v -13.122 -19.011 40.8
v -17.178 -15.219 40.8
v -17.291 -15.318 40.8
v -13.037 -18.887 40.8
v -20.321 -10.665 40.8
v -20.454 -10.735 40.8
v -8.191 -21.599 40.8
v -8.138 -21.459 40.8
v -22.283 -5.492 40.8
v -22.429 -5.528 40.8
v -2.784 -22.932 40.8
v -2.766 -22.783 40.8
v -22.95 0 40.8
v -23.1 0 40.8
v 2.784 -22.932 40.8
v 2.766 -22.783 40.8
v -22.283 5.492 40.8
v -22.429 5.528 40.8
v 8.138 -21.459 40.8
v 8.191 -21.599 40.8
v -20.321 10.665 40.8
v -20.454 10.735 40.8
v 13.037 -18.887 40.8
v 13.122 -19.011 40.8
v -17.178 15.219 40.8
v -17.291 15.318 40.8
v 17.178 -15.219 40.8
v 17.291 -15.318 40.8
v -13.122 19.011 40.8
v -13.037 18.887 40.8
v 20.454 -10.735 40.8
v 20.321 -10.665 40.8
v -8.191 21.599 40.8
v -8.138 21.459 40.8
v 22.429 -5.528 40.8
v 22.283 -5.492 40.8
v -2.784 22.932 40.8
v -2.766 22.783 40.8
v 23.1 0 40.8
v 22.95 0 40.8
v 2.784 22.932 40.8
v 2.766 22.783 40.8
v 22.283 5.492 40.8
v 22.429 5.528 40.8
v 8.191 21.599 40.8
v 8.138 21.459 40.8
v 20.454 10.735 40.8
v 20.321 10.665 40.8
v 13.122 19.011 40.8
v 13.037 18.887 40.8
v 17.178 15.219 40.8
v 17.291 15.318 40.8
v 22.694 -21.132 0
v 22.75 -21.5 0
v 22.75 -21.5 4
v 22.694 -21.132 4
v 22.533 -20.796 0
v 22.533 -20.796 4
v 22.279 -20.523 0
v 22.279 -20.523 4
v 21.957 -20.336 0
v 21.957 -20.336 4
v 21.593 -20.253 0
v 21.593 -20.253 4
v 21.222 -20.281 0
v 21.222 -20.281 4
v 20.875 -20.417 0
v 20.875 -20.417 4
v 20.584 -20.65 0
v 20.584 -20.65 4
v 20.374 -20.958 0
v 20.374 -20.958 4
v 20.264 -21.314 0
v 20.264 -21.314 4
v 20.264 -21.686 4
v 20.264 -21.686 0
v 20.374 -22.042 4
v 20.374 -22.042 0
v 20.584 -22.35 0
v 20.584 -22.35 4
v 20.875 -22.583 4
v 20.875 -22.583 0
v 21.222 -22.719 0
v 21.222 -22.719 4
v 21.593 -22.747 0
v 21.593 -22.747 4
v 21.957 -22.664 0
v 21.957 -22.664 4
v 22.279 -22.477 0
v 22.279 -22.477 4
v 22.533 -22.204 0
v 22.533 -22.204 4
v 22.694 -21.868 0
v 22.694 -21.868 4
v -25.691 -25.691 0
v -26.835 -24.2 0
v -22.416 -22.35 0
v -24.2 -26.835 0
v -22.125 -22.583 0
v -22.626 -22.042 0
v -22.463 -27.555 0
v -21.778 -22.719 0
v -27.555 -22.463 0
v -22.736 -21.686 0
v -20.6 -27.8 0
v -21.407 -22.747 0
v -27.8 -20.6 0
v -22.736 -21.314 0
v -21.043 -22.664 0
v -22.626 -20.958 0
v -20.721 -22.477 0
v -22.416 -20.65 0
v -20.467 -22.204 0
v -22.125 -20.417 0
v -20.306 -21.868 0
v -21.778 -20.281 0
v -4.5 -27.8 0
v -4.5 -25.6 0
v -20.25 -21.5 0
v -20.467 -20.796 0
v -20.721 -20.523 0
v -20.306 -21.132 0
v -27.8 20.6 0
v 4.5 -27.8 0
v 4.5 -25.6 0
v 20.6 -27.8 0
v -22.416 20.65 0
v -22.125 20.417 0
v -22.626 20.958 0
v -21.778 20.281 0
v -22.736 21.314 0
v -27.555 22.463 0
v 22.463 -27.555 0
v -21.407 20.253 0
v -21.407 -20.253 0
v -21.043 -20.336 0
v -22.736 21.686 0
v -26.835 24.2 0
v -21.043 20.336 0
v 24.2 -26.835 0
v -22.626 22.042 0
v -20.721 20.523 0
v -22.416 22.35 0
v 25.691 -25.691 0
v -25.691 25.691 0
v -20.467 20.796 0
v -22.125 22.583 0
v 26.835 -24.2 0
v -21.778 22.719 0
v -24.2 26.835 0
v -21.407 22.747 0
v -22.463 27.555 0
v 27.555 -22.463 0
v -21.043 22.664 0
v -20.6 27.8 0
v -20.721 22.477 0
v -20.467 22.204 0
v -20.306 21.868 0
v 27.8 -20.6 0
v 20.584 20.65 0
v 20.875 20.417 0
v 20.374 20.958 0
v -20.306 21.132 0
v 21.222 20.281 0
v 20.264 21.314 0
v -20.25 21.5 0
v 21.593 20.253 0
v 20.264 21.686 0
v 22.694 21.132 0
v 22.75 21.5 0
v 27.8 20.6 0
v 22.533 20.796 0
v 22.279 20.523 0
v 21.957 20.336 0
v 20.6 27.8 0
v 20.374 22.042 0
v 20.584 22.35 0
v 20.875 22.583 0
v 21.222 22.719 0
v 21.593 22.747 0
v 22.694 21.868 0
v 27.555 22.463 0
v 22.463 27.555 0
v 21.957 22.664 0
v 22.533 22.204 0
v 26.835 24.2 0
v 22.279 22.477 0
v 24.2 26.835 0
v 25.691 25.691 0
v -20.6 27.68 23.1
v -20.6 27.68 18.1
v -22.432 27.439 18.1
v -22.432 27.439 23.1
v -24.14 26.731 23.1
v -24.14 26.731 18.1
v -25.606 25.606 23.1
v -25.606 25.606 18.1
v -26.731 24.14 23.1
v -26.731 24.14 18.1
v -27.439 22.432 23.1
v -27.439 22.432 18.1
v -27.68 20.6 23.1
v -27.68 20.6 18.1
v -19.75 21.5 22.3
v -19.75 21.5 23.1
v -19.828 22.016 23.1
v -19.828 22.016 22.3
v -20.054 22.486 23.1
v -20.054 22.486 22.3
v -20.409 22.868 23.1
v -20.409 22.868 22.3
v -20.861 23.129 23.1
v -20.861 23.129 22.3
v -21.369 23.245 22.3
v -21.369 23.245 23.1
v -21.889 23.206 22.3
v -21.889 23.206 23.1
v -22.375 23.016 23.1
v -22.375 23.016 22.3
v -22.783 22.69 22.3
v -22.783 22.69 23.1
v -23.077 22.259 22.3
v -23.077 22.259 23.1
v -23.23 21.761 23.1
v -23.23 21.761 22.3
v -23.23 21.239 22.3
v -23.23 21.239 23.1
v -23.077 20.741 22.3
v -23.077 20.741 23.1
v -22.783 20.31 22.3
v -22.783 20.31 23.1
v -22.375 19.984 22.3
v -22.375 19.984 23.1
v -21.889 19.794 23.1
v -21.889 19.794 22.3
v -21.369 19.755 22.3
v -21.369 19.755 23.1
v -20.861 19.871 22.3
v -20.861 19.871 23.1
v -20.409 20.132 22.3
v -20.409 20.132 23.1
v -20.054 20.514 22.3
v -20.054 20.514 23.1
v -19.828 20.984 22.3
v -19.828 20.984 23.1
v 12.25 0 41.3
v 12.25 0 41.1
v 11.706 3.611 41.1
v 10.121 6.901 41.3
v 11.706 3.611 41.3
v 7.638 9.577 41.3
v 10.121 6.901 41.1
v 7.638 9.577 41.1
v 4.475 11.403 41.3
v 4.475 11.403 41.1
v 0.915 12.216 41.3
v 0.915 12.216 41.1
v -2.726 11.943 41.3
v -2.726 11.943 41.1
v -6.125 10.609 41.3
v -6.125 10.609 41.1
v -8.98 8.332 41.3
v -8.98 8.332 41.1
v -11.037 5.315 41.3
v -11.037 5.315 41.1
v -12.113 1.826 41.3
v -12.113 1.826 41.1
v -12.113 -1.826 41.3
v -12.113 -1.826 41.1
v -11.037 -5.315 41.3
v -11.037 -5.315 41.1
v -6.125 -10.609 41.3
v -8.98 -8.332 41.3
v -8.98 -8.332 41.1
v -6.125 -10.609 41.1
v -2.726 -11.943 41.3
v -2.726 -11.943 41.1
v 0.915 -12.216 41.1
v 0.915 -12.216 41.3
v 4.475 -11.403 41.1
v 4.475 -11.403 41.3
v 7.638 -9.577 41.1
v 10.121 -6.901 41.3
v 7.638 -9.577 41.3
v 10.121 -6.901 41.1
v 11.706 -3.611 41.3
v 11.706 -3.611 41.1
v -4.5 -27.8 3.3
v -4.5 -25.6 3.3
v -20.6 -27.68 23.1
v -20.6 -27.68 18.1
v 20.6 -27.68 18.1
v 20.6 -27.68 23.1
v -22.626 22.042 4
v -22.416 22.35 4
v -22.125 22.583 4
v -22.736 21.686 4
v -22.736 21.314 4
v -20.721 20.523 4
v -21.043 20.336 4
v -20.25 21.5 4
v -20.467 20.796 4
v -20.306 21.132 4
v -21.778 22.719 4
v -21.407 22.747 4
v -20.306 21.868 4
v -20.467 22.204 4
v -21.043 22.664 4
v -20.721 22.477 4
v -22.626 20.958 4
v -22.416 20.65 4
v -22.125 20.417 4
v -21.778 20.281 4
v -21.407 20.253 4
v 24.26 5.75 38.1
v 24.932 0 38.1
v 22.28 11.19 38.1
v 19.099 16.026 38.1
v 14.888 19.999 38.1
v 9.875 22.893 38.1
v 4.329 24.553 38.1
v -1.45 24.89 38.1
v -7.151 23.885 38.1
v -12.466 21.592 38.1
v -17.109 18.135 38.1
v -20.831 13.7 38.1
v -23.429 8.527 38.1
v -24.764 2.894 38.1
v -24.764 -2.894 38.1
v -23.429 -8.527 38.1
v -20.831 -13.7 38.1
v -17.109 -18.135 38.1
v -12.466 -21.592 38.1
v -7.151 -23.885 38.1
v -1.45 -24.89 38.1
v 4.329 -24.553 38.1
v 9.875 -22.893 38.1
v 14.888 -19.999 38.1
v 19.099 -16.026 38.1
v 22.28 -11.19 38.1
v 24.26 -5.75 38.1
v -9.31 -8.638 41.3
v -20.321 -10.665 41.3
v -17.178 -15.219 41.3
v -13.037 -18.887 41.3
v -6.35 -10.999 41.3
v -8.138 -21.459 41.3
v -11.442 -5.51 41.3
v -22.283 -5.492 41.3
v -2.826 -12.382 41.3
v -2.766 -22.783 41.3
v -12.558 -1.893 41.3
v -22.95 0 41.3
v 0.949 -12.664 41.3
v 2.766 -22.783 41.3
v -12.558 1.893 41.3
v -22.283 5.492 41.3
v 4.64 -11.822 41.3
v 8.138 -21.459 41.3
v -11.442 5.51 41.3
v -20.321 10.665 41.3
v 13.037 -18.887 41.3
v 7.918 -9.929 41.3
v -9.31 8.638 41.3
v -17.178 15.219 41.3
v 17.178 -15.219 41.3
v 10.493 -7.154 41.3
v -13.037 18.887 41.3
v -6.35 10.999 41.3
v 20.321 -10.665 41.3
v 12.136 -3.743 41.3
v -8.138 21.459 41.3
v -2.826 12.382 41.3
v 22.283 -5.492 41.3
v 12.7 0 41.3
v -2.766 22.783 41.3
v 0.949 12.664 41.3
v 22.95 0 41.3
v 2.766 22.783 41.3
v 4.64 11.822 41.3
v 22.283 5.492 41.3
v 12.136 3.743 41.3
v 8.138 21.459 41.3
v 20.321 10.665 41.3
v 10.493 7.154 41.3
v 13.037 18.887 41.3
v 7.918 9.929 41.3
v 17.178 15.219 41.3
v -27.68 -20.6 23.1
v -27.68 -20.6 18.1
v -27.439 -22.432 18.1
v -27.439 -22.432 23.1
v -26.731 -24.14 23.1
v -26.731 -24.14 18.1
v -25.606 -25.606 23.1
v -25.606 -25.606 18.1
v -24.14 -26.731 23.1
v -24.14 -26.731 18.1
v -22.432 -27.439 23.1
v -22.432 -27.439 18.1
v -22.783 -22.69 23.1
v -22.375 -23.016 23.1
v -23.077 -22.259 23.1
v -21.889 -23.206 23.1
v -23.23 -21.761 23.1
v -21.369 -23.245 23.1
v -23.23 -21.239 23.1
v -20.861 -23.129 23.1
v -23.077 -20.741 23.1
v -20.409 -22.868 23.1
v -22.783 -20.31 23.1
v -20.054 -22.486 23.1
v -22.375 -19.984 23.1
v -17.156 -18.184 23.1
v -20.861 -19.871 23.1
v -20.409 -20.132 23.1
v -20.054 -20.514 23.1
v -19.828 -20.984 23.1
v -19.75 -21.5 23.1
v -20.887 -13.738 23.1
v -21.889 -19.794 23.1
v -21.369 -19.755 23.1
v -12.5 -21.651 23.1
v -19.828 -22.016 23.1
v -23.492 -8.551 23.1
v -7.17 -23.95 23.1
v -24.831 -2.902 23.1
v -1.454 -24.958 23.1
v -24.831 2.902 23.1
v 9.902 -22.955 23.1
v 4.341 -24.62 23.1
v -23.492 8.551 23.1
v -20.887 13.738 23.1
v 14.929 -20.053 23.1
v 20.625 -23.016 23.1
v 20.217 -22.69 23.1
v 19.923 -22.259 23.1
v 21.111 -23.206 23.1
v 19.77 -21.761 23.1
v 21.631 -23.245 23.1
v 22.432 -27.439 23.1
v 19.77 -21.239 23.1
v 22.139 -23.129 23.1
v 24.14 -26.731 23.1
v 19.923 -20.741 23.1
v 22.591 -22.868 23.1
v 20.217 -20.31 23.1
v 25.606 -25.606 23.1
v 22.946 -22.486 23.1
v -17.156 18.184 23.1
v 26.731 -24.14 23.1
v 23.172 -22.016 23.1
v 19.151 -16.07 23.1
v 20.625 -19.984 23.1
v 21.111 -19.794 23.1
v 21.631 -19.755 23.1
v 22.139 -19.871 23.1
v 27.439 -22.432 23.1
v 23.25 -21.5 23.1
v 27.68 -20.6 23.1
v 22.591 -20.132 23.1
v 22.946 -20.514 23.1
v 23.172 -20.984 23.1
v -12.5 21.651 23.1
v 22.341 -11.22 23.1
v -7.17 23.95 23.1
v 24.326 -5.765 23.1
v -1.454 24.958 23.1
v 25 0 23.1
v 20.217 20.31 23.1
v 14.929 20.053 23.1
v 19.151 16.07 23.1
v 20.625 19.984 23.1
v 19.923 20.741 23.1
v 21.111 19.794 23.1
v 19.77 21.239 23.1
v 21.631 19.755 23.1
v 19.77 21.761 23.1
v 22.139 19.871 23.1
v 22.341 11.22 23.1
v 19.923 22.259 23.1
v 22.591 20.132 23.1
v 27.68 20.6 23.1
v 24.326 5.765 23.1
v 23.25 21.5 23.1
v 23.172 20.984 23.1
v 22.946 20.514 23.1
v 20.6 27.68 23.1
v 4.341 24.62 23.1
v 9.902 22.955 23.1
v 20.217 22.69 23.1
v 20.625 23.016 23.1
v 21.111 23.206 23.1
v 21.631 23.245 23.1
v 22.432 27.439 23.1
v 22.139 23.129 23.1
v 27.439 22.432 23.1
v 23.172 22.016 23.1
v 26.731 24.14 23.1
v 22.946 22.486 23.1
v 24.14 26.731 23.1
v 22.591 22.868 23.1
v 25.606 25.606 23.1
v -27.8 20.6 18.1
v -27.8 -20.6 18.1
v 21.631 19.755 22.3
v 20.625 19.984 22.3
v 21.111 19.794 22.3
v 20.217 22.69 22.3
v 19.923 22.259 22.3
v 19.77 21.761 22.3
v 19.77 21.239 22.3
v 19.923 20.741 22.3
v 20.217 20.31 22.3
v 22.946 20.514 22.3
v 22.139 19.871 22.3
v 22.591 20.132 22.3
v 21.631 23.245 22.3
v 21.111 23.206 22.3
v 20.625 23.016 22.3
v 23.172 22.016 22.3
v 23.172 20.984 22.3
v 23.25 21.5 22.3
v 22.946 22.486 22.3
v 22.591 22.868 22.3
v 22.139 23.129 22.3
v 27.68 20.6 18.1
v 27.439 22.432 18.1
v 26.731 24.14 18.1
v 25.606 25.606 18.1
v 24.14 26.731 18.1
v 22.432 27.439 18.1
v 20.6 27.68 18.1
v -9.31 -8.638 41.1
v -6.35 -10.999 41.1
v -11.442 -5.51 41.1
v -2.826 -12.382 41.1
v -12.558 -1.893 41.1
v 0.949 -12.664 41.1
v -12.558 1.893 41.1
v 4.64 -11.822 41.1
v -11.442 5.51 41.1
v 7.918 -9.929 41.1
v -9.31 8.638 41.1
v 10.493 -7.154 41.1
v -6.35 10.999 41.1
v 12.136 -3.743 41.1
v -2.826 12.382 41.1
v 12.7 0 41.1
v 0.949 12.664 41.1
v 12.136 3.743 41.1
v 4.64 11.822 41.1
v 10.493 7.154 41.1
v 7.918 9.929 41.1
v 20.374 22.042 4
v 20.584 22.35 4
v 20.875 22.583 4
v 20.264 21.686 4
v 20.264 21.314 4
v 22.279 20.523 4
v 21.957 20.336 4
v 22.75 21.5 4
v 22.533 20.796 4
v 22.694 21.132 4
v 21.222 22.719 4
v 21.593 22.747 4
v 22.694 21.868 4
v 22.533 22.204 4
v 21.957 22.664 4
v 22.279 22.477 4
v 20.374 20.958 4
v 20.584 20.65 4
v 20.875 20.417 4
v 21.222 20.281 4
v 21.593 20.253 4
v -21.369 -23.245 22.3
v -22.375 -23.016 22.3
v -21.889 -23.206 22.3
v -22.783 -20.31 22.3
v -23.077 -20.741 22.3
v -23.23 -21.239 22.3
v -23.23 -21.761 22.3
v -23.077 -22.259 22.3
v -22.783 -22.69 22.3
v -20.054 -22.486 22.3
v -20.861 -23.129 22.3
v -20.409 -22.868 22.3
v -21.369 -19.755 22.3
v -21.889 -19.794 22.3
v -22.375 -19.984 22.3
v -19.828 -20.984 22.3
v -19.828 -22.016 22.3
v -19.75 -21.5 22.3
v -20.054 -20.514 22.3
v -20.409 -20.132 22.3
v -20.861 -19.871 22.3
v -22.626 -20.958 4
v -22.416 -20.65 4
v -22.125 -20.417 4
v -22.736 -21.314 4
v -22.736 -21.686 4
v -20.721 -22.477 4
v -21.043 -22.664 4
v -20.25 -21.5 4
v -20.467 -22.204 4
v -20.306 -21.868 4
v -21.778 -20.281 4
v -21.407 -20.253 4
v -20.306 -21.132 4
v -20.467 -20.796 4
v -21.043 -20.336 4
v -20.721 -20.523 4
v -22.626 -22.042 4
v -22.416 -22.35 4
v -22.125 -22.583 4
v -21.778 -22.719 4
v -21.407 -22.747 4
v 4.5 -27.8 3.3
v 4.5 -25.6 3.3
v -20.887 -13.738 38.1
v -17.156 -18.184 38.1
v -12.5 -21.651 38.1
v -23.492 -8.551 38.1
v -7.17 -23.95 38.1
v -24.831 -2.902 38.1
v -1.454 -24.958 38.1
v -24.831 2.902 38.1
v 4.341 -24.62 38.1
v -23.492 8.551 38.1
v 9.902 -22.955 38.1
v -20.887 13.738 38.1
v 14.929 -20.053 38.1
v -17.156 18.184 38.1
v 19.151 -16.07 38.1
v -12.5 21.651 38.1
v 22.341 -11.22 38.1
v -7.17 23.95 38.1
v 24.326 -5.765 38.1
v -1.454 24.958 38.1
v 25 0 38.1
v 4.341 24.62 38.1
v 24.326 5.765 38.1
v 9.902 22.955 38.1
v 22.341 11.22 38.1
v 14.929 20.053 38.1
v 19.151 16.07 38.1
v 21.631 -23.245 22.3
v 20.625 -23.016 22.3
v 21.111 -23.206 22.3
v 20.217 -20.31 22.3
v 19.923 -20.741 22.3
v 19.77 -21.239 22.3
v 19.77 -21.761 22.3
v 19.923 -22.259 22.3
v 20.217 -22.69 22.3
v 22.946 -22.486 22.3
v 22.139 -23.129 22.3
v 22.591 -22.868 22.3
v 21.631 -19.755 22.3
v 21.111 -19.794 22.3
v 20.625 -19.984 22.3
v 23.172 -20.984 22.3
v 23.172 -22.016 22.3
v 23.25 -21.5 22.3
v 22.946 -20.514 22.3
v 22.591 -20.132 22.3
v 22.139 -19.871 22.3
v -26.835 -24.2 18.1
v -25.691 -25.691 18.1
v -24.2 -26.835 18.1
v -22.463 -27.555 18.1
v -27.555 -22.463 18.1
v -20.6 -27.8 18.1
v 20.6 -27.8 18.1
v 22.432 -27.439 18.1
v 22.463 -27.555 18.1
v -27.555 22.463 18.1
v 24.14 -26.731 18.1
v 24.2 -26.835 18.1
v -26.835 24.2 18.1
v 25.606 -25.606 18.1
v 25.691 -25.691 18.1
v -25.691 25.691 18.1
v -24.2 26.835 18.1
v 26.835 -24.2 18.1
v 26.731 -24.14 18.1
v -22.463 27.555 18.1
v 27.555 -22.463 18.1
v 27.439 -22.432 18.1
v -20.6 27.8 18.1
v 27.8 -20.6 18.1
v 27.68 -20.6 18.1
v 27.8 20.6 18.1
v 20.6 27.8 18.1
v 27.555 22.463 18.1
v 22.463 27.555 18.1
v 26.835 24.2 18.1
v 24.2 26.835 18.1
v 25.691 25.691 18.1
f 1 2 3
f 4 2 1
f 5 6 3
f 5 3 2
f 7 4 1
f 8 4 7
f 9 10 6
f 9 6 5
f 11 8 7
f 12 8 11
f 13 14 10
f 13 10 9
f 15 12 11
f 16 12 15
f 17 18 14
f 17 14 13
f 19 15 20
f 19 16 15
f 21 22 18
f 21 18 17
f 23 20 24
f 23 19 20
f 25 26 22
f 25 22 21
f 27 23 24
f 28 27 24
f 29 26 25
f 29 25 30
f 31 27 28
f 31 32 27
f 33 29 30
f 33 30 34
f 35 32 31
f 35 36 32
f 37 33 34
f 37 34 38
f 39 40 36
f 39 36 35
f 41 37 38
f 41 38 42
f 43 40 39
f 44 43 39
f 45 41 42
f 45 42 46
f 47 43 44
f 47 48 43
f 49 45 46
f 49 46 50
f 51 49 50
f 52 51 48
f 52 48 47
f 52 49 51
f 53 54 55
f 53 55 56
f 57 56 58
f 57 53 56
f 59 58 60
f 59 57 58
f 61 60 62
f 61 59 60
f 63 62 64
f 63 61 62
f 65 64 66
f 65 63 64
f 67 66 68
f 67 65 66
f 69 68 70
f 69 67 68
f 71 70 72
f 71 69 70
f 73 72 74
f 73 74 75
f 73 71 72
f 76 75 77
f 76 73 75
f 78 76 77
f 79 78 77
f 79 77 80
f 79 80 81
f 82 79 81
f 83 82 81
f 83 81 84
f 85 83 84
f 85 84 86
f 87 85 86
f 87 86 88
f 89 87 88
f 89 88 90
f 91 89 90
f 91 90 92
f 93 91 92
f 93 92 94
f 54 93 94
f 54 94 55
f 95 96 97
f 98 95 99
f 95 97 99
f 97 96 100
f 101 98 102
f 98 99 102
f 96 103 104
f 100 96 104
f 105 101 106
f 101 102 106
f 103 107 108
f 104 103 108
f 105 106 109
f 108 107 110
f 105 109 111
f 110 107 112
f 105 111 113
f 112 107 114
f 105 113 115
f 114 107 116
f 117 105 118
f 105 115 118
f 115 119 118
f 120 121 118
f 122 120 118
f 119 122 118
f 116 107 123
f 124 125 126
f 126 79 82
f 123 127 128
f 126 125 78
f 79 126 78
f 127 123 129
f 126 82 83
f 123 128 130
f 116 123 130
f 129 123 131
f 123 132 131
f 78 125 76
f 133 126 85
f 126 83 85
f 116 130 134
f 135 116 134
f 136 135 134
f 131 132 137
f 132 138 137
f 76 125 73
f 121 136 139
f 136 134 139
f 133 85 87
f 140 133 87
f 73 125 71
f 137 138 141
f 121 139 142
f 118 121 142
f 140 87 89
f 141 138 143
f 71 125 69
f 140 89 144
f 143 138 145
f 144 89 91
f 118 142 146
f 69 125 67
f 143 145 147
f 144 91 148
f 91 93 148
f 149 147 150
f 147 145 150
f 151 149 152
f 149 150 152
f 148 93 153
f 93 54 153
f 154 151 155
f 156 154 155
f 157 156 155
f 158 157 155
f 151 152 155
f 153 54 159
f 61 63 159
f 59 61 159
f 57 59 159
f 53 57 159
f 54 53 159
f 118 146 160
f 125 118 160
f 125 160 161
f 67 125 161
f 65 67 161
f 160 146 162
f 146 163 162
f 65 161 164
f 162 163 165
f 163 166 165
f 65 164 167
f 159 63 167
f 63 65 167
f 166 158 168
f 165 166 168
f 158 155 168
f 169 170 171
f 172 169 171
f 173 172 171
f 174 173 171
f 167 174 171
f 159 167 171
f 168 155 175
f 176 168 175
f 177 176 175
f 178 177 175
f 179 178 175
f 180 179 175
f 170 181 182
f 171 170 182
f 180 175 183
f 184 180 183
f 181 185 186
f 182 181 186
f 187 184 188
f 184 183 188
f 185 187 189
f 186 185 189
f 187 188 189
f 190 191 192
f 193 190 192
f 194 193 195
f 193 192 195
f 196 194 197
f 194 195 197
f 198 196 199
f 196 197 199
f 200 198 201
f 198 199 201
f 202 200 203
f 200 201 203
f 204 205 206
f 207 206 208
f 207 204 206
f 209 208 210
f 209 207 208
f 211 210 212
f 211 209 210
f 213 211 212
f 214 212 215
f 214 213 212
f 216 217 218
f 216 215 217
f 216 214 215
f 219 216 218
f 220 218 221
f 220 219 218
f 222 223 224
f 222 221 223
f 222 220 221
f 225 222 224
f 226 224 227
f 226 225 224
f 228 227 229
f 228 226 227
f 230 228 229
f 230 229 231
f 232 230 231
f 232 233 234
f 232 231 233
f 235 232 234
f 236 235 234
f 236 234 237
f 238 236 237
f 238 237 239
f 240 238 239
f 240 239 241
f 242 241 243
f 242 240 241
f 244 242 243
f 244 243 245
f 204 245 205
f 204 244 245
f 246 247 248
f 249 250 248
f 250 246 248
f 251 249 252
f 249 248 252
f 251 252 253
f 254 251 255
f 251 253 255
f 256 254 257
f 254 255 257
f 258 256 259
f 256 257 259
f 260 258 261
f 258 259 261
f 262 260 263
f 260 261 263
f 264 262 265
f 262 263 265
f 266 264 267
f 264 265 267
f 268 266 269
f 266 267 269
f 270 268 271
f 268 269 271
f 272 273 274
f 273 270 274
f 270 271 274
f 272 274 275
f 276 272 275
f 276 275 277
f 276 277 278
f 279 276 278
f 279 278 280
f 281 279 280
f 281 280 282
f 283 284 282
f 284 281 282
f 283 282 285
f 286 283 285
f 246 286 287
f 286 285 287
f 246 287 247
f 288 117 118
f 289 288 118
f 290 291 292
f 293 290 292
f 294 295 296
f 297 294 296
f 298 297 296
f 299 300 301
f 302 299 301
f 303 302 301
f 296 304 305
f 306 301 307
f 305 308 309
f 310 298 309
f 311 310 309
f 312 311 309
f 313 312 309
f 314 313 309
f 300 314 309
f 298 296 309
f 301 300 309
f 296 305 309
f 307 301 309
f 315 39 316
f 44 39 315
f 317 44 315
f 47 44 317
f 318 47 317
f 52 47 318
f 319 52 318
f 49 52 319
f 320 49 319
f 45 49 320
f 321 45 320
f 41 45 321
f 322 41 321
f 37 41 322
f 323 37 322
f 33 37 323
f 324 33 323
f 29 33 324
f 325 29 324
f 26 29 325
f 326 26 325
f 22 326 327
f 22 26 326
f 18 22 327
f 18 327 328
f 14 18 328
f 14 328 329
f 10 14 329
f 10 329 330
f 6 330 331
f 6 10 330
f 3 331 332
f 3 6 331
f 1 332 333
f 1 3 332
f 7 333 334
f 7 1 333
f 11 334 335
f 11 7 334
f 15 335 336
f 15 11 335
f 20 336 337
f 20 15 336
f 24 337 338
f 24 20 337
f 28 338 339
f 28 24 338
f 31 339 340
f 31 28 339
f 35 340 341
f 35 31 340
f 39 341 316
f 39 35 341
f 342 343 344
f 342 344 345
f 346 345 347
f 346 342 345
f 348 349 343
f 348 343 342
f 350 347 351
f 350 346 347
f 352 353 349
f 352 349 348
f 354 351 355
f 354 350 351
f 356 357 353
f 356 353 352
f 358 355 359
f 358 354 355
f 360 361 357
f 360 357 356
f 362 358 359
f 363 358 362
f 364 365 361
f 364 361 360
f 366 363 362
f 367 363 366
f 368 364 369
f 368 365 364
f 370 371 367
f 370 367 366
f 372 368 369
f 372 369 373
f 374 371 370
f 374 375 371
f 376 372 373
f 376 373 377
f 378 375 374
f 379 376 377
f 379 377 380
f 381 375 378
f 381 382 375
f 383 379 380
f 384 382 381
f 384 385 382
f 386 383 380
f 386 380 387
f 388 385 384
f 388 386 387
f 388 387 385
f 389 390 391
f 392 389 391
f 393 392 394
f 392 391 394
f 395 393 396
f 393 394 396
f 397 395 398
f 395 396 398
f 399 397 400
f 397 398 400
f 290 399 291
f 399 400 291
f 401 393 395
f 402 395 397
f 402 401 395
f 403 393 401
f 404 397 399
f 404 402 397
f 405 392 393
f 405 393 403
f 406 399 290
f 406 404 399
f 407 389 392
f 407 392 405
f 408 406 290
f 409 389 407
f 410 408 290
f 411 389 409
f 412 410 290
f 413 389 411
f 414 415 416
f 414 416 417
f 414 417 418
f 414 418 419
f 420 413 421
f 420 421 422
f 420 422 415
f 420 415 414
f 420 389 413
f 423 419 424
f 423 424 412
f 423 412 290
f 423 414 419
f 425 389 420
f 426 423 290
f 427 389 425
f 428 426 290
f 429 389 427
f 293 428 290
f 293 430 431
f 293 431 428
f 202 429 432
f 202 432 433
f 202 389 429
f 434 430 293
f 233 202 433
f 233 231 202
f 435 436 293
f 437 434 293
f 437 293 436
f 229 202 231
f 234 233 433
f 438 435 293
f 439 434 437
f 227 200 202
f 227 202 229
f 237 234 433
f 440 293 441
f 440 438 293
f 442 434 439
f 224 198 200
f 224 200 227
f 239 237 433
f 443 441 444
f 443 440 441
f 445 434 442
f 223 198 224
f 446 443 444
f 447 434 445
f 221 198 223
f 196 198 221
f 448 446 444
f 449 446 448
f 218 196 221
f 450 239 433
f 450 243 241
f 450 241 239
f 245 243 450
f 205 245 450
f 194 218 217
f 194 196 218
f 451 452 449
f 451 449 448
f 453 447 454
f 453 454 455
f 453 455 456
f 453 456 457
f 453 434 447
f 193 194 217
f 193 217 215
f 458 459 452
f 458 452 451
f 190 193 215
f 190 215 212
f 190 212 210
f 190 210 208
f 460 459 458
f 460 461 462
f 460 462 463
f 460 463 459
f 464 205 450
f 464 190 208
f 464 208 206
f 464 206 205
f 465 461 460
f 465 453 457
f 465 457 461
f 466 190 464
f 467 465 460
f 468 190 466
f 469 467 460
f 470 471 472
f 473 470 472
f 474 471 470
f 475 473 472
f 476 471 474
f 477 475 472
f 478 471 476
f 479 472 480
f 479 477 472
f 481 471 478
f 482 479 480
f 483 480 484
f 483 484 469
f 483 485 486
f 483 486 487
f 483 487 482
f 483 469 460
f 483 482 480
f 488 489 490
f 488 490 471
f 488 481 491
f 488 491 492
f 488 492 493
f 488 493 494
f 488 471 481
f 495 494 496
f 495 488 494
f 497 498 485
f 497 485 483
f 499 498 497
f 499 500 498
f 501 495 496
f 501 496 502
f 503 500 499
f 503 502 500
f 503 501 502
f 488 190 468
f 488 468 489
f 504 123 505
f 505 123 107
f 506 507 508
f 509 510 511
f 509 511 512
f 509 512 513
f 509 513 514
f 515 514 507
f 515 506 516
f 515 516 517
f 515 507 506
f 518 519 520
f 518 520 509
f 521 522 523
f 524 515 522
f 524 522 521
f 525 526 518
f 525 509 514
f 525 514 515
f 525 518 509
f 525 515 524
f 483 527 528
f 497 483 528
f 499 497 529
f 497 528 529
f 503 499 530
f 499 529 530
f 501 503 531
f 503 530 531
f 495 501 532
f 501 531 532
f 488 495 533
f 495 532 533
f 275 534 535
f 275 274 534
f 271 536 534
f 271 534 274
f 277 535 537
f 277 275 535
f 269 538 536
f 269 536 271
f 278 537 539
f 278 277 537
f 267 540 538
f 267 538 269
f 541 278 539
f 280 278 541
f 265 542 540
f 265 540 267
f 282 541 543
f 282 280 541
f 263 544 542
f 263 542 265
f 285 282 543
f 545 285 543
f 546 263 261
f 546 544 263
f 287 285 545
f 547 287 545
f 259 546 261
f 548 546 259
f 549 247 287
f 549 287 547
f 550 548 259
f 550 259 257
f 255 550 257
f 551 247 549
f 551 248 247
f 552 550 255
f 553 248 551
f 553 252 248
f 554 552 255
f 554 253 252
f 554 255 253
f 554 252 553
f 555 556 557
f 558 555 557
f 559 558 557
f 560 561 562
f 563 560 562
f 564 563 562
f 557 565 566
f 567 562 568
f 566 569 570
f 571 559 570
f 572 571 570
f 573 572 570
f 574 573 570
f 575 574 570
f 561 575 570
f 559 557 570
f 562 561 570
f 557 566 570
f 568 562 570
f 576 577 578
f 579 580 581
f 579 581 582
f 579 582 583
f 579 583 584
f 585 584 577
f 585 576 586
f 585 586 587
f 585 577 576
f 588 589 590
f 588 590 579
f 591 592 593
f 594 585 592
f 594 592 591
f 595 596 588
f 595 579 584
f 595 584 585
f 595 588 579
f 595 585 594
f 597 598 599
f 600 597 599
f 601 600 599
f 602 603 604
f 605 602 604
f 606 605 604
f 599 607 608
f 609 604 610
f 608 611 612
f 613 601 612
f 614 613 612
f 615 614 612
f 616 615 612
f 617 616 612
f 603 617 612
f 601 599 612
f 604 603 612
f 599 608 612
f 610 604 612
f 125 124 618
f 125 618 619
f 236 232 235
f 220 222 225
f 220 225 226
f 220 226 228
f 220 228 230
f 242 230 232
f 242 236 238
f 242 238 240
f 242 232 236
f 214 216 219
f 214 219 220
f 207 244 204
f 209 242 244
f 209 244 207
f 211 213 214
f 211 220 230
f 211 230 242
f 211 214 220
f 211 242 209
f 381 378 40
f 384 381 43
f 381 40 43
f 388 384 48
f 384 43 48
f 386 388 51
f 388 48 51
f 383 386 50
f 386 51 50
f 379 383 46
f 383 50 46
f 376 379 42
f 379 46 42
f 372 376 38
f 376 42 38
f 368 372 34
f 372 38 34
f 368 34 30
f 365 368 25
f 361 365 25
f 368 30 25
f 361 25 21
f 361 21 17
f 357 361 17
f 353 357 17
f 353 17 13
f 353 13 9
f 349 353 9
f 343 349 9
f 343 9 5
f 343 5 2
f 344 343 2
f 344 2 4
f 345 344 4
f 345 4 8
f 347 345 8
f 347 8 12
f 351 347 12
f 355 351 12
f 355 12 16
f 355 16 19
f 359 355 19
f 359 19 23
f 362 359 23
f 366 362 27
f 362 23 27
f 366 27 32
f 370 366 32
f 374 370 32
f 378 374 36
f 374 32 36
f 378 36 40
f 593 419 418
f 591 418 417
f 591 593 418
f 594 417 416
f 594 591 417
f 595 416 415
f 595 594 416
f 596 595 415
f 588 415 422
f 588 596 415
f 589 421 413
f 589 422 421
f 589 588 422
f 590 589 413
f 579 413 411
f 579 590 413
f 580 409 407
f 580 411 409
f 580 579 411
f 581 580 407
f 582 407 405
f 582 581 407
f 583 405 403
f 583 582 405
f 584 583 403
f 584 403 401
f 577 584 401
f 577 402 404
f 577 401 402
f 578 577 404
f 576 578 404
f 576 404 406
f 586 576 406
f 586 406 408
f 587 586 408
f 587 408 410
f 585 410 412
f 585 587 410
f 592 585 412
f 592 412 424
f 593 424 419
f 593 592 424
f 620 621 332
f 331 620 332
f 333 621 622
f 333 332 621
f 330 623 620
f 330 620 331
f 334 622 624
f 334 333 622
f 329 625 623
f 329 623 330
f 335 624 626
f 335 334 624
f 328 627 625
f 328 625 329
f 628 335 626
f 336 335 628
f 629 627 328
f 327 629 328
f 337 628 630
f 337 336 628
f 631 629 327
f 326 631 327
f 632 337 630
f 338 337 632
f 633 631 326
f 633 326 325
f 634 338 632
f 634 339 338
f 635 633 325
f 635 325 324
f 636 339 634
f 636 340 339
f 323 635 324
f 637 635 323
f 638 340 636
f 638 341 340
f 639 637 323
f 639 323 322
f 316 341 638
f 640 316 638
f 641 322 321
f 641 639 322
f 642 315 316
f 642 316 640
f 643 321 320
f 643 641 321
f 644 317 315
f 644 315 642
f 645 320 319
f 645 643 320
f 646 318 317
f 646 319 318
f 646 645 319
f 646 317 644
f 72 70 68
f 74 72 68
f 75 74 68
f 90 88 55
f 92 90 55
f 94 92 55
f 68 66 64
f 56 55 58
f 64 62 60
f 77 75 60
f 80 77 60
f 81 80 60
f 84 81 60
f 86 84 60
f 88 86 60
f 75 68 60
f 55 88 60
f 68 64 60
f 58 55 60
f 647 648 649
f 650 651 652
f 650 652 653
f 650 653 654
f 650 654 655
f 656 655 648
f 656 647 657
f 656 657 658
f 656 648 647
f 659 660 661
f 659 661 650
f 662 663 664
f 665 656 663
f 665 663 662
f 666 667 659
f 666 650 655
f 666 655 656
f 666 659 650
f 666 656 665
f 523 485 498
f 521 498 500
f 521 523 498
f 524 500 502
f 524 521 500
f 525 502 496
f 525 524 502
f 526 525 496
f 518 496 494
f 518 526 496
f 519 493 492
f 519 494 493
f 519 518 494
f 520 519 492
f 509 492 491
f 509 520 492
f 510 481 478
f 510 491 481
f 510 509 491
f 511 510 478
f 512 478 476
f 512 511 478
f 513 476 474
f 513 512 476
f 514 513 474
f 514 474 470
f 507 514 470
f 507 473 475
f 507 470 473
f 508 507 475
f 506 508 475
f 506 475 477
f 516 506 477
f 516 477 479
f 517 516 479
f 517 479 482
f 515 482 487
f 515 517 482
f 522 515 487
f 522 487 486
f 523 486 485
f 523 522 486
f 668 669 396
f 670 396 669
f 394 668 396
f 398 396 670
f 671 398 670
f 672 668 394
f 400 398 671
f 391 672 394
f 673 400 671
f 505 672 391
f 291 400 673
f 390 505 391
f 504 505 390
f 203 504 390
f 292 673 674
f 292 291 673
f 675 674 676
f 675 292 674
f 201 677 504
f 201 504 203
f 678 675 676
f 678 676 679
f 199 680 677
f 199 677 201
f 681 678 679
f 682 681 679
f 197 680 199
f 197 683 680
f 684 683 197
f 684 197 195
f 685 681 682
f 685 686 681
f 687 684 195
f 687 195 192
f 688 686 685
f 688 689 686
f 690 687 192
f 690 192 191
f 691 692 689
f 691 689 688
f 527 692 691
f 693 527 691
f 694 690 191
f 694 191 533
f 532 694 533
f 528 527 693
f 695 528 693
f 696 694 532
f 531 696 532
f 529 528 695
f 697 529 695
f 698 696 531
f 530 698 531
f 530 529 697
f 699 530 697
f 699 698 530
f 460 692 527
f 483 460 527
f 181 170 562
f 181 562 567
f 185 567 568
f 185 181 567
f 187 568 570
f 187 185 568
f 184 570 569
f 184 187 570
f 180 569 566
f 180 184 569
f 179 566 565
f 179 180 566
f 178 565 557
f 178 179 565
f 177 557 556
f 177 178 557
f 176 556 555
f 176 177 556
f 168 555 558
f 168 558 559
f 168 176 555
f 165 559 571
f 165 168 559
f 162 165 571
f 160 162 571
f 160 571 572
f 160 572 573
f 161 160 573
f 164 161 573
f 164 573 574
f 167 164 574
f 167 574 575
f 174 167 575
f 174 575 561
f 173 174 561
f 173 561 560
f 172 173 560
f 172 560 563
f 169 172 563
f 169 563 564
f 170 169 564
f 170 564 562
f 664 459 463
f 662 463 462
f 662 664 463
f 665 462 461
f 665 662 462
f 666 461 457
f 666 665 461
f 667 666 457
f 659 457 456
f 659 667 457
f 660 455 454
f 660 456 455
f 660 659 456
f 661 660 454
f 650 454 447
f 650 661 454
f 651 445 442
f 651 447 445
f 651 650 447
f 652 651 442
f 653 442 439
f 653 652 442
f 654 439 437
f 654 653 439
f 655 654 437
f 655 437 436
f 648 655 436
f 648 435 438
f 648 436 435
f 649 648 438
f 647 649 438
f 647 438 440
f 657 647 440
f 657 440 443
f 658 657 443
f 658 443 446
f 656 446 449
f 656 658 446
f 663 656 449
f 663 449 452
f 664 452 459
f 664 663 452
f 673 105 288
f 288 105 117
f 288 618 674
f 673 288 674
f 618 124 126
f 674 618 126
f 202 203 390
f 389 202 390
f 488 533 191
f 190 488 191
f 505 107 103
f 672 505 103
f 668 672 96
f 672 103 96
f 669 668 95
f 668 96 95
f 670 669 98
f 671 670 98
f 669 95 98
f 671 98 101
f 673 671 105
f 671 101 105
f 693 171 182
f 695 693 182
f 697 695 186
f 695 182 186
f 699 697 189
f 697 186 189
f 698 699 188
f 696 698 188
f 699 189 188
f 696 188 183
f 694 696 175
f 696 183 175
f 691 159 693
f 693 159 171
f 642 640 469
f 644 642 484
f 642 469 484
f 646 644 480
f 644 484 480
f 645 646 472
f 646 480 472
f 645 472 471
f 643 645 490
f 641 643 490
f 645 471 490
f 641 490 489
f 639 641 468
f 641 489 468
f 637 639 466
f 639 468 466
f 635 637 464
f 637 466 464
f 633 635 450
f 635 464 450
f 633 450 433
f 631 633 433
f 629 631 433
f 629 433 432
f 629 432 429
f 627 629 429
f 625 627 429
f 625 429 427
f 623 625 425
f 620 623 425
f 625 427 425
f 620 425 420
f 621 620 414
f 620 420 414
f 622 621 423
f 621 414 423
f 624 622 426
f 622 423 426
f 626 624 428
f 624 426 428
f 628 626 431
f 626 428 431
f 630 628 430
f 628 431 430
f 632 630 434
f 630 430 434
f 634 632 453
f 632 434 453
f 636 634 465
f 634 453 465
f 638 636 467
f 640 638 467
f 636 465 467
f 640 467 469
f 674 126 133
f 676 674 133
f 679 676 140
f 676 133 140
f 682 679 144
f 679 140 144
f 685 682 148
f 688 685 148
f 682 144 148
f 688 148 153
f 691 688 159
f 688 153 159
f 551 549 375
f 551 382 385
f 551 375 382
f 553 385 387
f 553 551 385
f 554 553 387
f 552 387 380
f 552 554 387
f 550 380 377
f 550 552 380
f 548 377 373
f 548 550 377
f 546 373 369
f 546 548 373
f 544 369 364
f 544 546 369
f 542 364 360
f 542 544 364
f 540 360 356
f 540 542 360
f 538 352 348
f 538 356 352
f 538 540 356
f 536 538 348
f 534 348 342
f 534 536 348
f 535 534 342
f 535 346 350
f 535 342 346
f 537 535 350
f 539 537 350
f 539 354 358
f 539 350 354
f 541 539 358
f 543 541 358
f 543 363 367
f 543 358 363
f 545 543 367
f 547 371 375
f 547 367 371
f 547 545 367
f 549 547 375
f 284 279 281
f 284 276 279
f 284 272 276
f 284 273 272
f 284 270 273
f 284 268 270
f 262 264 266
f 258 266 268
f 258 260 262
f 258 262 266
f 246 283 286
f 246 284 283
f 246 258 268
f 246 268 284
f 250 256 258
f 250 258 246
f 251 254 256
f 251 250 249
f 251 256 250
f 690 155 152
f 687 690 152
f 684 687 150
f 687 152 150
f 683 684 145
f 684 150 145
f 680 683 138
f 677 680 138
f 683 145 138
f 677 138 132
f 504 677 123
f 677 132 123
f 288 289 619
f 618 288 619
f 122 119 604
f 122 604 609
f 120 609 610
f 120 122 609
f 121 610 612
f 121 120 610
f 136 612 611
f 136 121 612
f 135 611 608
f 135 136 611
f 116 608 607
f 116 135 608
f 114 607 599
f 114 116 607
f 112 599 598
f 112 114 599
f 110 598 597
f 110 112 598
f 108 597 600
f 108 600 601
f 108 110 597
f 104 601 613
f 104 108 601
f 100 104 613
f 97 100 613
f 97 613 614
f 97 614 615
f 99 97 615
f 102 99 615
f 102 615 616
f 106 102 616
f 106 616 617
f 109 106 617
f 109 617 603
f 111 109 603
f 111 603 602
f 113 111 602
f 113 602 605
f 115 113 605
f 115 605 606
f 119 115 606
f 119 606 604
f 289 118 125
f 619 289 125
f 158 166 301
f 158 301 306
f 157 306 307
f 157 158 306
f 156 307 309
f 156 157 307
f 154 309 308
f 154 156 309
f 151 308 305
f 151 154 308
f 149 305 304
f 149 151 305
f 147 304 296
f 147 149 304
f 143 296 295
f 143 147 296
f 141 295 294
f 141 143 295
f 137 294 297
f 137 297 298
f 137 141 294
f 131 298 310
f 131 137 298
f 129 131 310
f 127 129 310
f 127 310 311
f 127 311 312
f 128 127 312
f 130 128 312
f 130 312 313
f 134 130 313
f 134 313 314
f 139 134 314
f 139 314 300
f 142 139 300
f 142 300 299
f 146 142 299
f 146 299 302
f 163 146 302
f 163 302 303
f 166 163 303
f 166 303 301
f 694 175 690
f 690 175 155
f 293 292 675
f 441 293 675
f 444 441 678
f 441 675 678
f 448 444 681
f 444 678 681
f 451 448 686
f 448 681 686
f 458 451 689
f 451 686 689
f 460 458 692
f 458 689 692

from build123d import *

# Parameters (mm, degrees)
BASE_HOUSING_DEPTH                     = 18.1
UPPER_START                            = 18
UPPER_HOUSING_RIM_DEPTH                = 5.1
OPTICAL_START                          = 23
OPTICAL_ENCLOSURE_PROFILE_R            = 25
OPTICAL_ENCLOSURE_DEPTH                = 15.1
TAPERED_START                          = 38
TAPERED_COVER_PROFILE_R                = 25
TAPERED_COVER_DEPTH                    = 2.8
TAPERED_COVER_TAPER                    = 34.159694546
COVER_START                            = 40.7
COVER_DISK_PROFILE_R                   = 22.95
COVER_DISK_DEPTH                       = 0.6
FOUR_START                             = -0.05
FOUR_M2_5_MOUNTING_POSITIONS_PROFILE_R = 1.25
FOUR_M2_5_MOUNTING_POSITIONS_DEPTH     = 4.05
UPPER_START_2                          = 22.3
UPPER_RECESSES_PROFILE_R               = 1.75
UPPER_RECESSES_DEPTH                   = 1
CABLE_START                            = -0.05
CABLE_OUTLET_RECESS_PROFILE_W          = 9
CABLE_OUTLET_RECESS_PROFILE_H          = 2.4
CABLE_OUTLET_RECESS_DEPTH              = 3.35
COVER_START_2                          = 41.1
COVER_GROOVE_PROFILE_R                 = 12.7
COVER_GROOVE_PROFILE_R_2               = 12.25
COVER_GROOVE_DEPTH                     = 0.4


with BuildPart() as part:
    # Base housing profile → Base housing (new body)
    with BuildSketch(Plane.XY):
        with BuildLine():
            Line((-20.6, -27.8), (20.6, -27.8))
            ThreePointArc((20.6, -27.8), (25.691168825, -25.691168825), (27.8, -20.6))
            Line((27.8, -20.6), (27.8, 20.6))
            ThreePointArc((27.8, 20.6), (25.691168825, 25.691168825), (20.6, 27.8))
            Line((20.6, 27.8), (-20.6, 27.8))
            ThreePointArc((-20.6, 27.8), (-25.691168825, 25.691168825), (-27.8, 20.6))
            Line((-27.8, 20.6), (-27.8, -20.6))
            ThreePointArc((-27.8, -20.6), (-25.691168825, -25.691168825), (-20.6, -27.8))
        make_face()
    extrude(amount=BASE_HOUSING_DEPTH)

    # Upper housing rim profile → Upper housing rim (add)
    with BuildSketch(Plane.XY.offset(UPPER_START)):
        with BuildLine():
            Line((-20.6, -27.68), (20.6, -27.68))
            ThreePointArc((20.6, -27.68), (25.606316011, -25.606316011), (27.68, -20.6))
            Line((27.68, -20.6), (27.68, 20.6))
            ThreePointArc((27.68, 20.6), (25.606316011, 25.606316011), (20.6, 27.68))
            Line((20.6, 27.68), (-20.6, 27.68))
            ThreePointArc((-20.6, 27.68), (-25.606316011, 25.606316011), (-27.68, 20.6))
            Line((-27.68, 20.6), (-27.68, -20.6))
            ThreePointArc((-27.68, -20.6), (-25.606316011, -25.606316011), (-20.6, -27.68))
        make_face()
    extrude(amount=UPPER_HOUSING_RIM_DEPTH)

    # Optical enclosure profile → Optical enclosure (add)
    with BuildSketch(Plane.XY.offset(OPTICAL_START)):
        Circle(OPTICAL_ENCLOSURE_PROFILE_R)
    extrude(amount=OPTICAL_ENCLOSURE_DEPTH)

    # Tapered cover profile → Tapered cover (add)
    with BuildSketch(Plane.XY.offset(TAPERED_START)):
        Circle(TAPERED_COVER_PROFILE_R)
    extrude(amount=TAPERED_COVER_DEPTH, taper=TAPERED_COVER_TAPER)

    # Cover disk profile → Cover disk (add)
    with BuildSketch(Plane.XY.offset(COVER_START)):
        Circle(COVER_DISK_PROFILE_R)
    extrude(amount=COVER_DISK_DEPTH)

    # Four M2.5 mounting positions profile → Four M2.5 mounting positions (cut)
    with BuildSketch(Plane.XY.offset(FOUR_START)):
        with Locations((-21.5, -21.5)):
            Circle(FOUR_M2_5_MOUNTING_POSITIONS_PROFILE_R)
        with Locations((-21.5, 21.5)):
            Circle(FOUR_M2_5_MOUNTING_POSITIONS_PROFILE_R)
        with Locations((21.5, -21.5)):
            Circle(FOUR_M2_5_MOUNTING_POSITIONS_PROFILE_R)
        with Locations((21.5, 21.5)):
            Circle(FOUR_M2_5_MOUNTING_POSITIONS_PROFILE_R)
    extrude(amount=FOUR_M2_5_MOUNTING_POSITIONS_DEPTH, mode=Mode.SUBTRACT)

    # Upper recesses profile → Upper recesses (cut)
    with BuildSketch(Plane.XY.offset(UPPER_START_2)):
        with Locations((-21.5, -21.5)):
            Circle(UPPER_RECESSES_PROFILE_R)
        with Locations((-21.5, 21.5)):
            Circle(UPPER_RECESSES_PROFILE_R)
        with Locations((21.5, -21.5)):
            Circle(UPPER_RECESSES_PROFILE_R)
        with Locations((21.5, 21.5)):
            Circle(UPPER_RECESSES_PROFILE_R)
    extrude(amount=UPPER_RECESSES_DEPTH, mode=Mode.SUBTRACT)

    # Cable outlet recess profile → Cable outlet recess (cut)
    with BuildSketch(Plane.XY.offset(CABLE_START)):
        with Locations((0, -26.8)):
            Rectangle(CABLE_OUTLET_RECESS_PROFILE_W, CABLE_OUTLET_RECESS_PROFILE_H)
    extrude(amount=CABLE_OUTLET_RECESS_DEPTH, mode=Mode.SUBTRACT)

    # Cover groove profile → Cover groove (cut)
    with BuildSketch(Plane.XY.offset(COVER_START_2)):
        Circle(COVER_GROOVE_PROFILE_R)
        Circle(COVER_GROOVE_PROFILE_R_2, mode=Mode.SUBTRACT)
    extrude(amount=COVER_GROOVE_DEPTH, mode=Mode.SUBTRACT)


solid = part.part
